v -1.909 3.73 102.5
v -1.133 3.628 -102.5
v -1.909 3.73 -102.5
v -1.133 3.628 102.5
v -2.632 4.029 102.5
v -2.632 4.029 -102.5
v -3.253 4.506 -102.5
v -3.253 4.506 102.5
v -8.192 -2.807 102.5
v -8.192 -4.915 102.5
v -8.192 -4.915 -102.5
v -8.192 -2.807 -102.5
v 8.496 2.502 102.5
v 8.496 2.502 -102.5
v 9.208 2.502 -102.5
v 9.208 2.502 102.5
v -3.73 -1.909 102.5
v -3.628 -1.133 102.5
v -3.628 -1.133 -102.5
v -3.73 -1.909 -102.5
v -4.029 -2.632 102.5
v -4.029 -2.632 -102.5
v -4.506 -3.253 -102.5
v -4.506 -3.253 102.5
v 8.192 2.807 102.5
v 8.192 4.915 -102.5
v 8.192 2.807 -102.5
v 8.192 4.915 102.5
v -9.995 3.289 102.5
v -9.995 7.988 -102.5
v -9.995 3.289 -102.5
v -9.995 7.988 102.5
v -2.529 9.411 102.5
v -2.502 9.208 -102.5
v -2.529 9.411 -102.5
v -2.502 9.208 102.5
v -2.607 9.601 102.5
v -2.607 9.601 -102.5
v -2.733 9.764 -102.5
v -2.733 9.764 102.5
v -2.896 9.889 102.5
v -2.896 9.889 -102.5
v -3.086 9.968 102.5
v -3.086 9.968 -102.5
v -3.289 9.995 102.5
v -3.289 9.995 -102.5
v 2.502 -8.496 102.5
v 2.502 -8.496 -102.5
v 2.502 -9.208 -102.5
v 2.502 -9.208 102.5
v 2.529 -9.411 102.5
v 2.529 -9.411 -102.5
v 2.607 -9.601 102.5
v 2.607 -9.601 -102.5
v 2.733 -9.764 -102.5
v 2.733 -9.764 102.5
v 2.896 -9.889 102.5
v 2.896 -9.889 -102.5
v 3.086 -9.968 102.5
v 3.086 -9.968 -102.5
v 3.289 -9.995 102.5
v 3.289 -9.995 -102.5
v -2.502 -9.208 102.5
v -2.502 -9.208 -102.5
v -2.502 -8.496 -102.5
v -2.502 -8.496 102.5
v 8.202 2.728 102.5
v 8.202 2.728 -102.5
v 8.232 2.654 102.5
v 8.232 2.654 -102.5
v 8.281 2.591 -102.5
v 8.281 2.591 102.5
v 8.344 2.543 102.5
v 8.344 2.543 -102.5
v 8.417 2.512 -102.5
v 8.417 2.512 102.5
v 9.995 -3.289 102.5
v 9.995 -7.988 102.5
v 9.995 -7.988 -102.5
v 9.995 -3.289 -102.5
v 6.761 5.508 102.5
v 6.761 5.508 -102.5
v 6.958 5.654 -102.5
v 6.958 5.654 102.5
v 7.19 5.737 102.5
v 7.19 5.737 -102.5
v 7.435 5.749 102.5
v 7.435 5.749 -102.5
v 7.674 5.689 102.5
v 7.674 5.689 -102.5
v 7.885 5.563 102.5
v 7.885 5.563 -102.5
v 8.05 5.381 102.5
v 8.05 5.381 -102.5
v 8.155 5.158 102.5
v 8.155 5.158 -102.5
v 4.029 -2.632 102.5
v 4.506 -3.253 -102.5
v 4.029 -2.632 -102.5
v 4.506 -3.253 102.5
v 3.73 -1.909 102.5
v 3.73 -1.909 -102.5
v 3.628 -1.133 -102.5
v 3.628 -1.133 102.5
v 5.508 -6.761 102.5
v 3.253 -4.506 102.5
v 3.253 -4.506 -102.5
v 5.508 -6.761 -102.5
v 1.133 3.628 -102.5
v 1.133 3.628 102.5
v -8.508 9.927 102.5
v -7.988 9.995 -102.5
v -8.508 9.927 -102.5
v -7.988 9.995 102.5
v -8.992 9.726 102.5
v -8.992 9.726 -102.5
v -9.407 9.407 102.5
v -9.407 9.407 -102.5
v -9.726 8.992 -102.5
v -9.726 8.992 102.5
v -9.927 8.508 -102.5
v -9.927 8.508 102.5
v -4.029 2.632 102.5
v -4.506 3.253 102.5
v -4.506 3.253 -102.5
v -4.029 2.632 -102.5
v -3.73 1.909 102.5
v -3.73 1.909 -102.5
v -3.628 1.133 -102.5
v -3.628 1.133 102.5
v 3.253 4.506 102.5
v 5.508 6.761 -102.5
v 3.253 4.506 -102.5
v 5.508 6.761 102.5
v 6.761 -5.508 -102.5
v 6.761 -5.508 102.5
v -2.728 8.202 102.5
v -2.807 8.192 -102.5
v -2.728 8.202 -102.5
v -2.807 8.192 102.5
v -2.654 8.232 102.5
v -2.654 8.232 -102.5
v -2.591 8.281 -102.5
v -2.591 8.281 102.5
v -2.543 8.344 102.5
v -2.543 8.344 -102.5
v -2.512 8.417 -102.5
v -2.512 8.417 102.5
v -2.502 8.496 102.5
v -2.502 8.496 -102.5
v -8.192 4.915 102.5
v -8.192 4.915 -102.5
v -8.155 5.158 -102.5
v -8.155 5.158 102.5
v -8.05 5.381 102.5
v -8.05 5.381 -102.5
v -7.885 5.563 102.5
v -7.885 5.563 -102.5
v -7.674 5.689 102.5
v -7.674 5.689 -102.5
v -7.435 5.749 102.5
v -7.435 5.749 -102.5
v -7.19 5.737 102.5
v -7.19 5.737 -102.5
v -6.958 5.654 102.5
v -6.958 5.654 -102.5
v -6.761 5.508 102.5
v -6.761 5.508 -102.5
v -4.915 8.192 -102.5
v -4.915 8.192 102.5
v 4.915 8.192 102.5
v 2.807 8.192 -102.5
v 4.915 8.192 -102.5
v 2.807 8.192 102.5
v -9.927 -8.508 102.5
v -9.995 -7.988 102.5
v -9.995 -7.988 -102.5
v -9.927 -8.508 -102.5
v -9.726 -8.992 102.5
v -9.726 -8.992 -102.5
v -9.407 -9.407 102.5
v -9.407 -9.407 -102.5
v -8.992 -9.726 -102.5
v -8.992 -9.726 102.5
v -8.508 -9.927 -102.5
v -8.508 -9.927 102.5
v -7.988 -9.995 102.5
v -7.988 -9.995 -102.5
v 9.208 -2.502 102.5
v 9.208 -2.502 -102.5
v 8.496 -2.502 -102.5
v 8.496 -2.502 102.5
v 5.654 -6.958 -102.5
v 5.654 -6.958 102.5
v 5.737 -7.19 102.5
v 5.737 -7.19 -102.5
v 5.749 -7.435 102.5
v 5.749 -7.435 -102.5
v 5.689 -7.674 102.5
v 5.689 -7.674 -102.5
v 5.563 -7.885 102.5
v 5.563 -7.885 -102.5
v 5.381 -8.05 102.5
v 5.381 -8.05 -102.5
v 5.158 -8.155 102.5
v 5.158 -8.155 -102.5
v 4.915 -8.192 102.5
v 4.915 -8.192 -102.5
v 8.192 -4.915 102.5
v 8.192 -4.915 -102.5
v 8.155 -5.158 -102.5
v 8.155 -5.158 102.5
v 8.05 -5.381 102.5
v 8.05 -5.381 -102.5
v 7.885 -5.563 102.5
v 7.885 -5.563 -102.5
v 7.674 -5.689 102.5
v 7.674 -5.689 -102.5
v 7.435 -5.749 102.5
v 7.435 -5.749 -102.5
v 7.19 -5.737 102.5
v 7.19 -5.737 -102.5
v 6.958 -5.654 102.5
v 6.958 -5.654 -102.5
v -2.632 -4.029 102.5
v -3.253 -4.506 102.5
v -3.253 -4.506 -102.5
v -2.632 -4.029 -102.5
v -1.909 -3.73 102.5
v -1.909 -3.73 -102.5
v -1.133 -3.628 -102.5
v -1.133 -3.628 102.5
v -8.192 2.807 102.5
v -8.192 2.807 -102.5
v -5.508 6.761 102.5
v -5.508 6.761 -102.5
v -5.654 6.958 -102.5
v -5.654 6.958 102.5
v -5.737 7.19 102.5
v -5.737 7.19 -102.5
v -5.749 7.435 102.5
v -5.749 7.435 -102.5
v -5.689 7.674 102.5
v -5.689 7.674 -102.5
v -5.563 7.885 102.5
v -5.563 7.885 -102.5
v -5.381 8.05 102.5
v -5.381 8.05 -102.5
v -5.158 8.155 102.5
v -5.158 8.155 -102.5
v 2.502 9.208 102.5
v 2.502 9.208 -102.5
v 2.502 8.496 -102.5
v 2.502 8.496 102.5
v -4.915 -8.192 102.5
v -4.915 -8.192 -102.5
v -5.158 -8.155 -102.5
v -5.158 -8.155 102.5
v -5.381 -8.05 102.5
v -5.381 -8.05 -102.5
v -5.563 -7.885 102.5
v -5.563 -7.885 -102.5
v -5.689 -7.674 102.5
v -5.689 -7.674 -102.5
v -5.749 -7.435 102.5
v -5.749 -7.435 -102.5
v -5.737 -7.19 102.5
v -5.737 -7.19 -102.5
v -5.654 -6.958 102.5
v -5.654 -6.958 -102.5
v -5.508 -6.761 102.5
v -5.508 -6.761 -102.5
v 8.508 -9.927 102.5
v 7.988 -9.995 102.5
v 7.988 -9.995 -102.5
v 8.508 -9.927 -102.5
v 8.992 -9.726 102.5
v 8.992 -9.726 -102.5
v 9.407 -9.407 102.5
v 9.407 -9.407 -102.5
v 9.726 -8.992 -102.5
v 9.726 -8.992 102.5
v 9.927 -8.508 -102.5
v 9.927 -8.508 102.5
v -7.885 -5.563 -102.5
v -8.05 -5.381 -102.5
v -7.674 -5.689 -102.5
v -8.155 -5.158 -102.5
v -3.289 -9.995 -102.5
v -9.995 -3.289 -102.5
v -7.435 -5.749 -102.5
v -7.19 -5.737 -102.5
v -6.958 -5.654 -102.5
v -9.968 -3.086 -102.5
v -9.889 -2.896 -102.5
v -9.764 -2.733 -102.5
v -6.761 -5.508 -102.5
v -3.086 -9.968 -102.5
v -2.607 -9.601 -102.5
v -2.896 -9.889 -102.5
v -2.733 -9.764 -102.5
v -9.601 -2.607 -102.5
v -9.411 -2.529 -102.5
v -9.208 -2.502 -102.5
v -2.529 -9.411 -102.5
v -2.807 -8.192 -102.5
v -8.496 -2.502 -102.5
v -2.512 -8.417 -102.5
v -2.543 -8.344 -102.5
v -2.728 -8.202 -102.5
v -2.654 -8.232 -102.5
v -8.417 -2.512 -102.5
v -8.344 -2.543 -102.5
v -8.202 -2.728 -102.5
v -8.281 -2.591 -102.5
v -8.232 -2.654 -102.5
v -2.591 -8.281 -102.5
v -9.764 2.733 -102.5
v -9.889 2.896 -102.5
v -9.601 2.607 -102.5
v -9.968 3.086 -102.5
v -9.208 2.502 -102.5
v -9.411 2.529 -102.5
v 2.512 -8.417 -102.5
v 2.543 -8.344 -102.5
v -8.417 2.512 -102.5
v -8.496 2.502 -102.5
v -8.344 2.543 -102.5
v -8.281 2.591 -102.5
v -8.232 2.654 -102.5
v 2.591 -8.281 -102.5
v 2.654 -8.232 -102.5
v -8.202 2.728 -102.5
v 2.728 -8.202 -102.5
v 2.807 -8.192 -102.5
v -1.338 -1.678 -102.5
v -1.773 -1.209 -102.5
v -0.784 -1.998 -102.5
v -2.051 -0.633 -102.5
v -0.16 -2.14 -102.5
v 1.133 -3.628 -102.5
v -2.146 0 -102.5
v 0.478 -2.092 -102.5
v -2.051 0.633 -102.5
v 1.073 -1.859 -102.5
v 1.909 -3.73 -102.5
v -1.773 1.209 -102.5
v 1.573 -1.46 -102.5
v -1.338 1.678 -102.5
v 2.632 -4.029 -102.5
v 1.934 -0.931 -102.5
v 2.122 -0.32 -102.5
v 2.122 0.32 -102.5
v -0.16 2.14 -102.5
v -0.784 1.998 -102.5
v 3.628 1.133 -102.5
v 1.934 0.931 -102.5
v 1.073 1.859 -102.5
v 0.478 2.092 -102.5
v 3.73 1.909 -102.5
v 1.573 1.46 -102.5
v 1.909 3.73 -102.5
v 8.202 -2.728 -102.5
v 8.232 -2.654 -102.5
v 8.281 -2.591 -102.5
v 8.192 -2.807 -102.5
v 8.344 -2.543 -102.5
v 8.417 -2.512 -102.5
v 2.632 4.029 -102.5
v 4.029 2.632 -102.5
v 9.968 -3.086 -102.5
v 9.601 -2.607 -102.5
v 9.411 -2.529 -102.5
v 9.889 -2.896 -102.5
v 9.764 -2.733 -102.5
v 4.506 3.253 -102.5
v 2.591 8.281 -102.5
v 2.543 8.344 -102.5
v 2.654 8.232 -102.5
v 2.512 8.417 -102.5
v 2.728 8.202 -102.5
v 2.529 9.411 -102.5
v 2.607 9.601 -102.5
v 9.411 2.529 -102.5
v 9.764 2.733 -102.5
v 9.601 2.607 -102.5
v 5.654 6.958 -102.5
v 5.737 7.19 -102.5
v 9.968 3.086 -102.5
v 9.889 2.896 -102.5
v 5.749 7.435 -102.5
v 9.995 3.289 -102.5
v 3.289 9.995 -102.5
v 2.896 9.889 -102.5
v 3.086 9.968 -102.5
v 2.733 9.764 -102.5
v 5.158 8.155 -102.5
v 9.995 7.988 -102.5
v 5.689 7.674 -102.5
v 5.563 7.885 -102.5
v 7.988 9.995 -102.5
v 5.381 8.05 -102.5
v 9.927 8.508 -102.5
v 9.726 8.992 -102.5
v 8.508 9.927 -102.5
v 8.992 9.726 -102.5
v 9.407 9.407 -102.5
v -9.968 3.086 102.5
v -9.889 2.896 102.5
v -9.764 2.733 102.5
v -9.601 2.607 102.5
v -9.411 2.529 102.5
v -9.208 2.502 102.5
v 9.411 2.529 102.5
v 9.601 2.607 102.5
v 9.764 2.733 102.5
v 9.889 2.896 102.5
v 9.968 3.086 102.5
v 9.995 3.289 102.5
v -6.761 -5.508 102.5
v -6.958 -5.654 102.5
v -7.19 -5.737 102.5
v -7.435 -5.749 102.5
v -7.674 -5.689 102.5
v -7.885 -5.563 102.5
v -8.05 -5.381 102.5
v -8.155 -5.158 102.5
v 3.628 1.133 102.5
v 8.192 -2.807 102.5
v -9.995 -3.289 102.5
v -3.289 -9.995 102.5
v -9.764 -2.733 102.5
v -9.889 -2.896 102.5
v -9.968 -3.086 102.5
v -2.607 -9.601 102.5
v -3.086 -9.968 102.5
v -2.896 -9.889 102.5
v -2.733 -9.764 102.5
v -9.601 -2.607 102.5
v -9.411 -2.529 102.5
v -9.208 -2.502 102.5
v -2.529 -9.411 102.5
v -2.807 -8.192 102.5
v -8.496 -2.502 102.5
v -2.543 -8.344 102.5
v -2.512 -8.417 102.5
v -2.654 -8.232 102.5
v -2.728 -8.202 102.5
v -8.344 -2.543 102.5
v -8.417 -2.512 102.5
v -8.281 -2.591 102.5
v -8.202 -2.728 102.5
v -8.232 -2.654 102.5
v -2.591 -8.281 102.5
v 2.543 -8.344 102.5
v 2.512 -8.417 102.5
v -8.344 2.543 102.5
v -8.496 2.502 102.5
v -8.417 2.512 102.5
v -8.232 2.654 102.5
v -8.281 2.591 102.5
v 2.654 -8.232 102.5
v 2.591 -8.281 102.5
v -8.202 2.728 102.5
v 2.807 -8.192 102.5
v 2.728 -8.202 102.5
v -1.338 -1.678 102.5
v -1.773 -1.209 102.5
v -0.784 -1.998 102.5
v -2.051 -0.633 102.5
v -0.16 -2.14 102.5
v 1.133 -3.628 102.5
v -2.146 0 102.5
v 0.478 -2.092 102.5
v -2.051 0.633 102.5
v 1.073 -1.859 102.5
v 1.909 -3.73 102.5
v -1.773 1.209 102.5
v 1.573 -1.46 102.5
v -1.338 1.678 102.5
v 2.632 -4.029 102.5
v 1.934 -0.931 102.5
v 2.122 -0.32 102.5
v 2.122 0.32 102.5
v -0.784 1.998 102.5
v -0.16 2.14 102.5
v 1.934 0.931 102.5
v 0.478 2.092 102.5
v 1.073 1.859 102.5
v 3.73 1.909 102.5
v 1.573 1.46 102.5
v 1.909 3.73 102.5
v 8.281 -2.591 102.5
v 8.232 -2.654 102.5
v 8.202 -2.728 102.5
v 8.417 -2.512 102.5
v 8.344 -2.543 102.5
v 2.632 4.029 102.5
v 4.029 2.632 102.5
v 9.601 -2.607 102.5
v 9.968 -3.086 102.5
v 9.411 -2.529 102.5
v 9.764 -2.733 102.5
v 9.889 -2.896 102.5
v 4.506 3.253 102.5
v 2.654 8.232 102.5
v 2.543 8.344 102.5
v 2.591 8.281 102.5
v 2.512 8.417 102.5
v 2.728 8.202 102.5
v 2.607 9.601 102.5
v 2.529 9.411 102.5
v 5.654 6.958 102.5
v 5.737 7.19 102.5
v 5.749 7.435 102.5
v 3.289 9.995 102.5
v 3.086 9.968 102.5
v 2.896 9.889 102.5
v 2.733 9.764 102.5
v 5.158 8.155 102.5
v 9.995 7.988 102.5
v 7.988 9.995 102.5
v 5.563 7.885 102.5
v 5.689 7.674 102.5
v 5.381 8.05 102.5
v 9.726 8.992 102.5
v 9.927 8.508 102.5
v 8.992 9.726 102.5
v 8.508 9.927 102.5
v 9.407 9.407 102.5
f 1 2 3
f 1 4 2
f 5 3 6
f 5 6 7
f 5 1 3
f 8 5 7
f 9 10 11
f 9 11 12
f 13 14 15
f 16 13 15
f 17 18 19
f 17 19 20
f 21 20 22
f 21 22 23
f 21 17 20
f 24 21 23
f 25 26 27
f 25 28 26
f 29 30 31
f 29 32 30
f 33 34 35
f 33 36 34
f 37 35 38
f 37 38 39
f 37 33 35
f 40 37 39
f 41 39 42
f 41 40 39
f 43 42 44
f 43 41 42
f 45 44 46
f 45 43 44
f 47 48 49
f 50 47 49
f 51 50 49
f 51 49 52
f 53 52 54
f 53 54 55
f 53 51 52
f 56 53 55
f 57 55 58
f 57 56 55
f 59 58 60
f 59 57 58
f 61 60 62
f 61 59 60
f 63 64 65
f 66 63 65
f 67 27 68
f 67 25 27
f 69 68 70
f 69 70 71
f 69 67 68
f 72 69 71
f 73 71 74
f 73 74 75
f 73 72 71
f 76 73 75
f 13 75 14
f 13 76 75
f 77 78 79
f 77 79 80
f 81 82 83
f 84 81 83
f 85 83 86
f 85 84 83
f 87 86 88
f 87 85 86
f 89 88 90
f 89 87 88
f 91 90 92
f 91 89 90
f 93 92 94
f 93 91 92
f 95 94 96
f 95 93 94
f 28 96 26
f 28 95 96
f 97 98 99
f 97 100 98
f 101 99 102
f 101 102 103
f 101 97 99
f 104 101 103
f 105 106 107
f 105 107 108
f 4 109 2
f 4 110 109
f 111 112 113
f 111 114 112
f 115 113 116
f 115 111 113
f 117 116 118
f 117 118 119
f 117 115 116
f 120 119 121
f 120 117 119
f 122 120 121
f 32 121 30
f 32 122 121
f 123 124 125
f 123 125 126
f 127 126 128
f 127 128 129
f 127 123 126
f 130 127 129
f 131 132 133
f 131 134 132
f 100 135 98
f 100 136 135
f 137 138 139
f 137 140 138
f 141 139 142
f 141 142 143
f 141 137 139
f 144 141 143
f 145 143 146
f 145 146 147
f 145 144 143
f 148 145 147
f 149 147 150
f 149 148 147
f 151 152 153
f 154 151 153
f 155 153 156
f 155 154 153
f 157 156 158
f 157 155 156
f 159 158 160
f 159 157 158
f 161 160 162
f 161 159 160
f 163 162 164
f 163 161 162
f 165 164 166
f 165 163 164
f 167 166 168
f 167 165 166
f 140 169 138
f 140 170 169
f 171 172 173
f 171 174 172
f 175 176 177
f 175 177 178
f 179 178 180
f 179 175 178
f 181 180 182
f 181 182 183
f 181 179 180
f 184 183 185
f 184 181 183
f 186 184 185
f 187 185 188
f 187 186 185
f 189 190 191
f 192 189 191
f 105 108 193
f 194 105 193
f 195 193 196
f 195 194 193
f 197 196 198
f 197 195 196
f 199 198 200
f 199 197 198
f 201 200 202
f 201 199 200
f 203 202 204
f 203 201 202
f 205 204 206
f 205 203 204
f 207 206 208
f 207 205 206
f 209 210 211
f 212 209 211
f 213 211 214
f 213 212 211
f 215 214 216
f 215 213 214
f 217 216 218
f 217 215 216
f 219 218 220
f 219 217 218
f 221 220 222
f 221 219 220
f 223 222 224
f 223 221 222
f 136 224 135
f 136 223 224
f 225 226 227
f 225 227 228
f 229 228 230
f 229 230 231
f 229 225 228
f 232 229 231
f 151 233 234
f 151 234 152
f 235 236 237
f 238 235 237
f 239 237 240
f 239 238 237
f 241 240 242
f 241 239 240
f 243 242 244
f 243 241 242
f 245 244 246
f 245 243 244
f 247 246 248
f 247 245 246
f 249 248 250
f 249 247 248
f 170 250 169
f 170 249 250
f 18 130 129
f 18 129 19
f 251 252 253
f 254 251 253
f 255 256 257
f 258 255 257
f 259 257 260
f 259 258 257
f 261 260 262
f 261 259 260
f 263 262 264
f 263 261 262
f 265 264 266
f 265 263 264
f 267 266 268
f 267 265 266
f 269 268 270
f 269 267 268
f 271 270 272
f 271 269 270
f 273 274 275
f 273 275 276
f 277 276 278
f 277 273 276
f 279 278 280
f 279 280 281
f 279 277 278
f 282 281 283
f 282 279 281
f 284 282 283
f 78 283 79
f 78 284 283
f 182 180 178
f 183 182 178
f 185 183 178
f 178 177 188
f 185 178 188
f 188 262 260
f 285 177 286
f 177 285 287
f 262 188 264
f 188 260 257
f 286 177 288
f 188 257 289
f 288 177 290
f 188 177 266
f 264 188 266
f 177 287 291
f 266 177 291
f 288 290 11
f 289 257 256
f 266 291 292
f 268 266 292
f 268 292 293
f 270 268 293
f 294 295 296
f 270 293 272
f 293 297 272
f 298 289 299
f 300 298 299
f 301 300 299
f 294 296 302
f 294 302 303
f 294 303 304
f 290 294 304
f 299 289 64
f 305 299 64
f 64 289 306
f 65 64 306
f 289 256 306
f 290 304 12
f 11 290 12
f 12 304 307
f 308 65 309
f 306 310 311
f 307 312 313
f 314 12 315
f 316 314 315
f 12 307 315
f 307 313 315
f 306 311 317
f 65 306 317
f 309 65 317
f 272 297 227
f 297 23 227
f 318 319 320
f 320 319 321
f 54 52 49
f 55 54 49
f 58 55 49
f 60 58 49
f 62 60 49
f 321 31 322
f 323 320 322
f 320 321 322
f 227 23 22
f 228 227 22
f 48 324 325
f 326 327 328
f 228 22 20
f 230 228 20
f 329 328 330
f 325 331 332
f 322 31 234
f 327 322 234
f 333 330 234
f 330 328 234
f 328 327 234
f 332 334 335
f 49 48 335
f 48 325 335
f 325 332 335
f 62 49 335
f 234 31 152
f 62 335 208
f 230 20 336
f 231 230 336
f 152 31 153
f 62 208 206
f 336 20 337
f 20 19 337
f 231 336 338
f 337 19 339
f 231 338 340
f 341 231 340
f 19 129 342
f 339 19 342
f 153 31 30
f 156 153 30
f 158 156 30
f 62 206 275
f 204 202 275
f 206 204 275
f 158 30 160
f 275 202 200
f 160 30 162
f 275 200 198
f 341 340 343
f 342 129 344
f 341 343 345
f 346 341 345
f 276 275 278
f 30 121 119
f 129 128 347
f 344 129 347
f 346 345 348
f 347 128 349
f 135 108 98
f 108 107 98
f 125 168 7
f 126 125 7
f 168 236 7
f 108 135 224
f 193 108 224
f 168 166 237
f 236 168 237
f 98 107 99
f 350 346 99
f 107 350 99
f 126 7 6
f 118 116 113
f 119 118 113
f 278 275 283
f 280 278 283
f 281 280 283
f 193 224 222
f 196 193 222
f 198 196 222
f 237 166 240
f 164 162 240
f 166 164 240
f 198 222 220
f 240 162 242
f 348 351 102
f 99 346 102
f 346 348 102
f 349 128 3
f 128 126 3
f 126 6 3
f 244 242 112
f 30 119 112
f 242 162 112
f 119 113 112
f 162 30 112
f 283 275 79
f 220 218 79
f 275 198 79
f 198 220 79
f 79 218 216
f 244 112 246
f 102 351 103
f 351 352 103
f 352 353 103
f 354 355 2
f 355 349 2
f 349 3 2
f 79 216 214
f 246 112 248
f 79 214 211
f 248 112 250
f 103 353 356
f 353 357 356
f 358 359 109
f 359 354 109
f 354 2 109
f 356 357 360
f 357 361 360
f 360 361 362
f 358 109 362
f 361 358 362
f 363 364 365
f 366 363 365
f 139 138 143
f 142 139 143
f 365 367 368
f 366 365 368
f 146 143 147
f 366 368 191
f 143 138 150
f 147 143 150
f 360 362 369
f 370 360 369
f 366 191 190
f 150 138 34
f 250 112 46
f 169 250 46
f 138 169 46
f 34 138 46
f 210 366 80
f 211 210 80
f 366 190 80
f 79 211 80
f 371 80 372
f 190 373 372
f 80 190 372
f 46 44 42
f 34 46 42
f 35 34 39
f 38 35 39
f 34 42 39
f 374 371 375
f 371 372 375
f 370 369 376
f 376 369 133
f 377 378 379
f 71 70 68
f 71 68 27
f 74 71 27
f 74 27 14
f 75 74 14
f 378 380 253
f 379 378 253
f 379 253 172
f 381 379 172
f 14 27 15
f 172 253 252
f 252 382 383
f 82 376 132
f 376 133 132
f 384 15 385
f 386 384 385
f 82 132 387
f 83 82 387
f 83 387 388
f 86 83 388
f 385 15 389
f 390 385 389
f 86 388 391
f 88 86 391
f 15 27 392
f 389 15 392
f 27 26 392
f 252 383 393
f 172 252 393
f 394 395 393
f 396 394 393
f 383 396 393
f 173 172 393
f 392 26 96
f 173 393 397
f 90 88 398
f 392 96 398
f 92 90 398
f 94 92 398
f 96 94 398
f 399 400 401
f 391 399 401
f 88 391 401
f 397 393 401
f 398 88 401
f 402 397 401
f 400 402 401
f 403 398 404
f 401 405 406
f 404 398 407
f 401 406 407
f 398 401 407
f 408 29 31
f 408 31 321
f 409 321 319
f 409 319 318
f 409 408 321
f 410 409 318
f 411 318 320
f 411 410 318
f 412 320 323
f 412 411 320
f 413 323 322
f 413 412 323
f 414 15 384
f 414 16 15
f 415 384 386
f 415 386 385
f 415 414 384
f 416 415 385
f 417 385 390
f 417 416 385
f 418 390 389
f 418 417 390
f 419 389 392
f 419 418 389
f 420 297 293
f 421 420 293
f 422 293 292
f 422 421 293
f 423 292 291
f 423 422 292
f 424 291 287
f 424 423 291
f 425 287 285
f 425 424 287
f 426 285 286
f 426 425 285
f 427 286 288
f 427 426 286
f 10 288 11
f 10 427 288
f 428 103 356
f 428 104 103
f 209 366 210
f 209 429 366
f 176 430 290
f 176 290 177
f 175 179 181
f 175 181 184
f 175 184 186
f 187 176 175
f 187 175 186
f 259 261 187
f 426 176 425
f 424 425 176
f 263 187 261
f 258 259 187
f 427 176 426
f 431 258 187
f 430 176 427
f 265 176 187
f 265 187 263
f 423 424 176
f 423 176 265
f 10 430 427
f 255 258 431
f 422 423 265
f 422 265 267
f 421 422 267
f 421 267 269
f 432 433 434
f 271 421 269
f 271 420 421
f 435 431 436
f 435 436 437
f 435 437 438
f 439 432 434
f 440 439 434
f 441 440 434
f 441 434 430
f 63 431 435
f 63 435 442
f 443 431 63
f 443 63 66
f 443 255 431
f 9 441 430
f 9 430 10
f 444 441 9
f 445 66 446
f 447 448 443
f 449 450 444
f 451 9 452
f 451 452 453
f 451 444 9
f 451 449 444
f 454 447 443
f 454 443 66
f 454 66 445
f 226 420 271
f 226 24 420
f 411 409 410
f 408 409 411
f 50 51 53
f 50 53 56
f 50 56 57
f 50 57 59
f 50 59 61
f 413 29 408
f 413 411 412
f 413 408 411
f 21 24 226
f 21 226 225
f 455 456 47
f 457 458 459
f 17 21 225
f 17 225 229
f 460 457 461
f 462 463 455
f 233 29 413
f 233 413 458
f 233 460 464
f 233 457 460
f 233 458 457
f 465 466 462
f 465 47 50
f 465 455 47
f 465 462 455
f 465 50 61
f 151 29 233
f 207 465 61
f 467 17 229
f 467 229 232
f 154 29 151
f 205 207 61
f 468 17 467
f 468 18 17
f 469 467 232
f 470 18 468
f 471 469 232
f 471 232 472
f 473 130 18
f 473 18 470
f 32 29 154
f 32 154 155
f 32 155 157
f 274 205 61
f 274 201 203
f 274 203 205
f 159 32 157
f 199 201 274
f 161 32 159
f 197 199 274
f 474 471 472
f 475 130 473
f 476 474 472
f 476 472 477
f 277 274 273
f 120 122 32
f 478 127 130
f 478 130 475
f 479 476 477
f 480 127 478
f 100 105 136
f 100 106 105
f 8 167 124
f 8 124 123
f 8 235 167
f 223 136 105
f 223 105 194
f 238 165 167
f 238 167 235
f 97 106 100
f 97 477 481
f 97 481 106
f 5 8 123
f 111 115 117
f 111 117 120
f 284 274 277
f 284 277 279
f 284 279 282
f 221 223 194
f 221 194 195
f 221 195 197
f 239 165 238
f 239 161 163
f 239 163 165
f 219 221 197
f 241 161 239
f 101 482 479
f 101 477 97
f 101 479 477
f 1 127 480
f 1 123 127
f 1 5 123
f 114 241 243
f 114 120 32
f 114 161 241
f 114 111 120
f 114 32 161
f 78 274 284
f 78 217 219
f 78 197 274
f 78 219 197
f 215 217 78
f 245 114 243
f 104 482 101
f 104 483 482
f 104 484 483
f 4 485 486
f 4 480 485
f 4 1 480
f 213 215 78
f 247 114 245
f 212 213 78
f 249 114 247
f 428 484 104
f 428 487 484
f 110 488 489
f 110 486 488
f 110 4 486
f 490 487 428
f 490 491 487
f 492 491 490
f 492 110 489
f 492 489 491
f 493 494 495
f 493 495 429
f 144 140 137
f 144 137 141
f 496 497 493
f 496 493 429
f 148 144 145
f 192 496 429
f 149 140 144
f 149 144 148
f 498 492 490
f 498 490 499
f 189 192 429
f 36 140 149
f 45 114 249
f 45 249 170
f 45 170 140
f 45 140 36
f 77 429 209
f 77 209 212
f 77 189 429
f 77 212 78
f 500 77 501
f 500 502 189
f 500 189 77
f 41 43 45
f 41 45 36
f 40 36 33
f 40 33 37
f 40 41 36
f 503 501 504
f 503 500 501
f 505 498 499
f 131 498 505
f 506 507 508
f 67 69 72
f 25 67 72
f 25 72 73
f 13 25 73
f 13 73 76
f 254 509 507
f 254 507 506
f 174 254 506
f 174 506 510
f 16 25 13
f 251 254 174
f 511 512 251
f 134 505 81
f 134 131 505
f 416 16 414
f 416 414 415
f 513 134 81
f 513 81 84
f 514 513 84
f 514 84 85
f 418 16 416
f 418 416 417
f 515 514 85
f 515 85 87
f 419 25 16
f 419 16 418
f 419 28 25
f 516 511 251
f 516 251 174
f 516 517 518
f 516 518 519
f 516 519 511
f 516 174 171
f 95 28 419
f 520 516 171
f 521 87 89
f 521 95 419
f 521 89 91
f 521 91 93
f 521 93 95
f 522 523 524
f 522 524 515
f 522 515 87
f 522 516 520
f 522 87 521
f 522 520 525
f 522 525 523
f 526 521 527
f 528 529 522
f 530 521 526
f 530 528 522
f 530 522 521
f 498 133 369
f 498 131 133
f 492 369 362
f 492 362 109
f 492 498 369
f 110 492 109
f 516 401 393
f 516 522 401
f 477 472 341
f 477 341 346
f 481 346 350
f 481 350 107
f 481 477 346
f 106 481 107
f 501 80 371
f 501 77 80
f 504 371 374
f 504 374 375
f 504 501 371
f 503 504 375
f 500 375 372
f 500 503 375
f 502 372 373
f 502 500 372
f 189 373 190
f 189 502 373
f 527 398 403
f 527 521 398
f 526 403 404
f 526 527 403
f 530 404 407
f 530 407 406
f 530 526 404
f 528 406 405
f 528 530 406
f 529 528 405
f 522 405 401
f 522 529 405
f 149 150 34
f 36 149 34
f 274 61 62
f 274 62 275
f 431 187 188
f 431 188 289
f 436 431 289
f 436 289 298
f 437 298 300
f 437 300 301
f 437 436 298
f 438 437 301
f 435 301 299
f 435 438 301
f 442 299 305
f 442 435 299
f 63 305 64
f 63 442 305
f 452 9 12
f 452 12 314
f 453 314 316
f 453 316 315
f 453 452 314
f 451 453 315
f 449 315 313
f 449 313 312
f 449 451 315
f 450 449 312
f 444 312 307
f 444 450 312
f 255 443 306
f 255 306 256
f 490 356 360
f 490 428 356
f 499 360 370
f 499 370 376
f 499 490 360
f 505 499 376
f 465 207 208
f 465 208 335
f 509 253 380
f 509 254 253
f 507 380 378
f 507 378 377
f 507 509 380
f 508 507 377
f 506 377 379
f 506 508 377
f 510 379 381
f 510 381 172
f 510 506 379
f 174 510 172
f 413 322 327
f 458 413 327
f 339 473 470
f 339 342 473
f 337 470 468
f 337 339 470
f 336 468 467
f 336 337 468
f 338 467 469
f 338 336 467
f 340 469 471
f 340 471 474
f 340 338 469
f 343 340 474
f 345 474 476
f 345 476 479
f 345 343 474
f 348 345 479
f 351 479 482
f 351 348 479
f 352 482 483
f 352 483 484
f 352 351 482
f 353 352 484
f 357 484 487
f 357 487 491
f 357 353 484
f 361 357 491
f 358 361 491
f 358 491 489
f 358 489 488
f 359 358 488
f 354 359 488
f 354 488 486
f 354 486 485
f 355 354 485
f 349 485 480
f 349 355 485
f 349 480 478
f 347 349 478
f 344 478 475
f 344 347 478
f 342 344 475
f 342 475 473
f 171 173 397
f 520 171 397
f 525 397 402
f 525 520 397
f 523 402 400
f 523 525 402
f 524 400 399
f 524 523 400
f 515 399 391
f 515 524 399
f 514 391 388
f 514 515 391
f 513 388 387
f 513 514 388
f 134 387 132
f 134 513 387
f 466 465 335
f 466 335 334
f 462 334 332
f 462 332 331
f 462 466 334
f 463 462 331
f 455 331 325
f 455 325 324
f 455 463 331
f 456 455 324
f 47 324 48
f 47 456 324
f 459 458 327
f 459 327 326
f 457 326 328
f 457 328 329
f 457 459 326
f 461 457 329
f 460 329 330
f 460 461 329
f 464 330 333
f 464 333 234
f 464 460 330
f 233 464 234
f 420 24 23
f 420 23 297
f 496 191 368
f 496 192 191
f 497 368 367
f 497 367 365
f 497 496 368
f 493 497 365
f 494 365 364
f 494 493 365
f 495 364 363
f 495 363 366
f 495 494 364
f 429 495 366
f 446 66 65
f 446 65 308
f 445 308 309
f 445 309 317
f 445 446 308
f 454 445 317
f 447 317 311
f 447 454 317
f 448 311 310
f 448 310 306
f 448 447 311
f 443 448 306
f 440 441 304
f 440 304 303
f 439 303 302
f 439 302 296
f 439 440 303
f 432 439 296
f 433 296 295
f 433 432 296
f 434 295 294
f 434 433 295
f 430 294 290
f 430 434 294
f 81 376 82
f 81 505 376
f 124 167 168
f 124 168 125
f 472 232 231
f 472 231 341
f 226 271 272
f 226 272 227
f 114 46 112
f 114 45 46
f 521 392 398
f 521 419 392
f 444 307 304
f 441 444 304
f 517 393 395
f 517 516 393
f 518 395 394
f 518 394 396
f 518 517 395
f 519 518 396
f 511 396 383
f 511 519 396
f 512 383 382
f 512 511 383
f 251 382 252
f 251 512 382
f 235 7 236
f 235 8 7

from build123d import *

# Parameters (mm, degrees)
SKETCH1_R           = 2.1463
BOSS_EXTRUDE1_DEPTH = 102.5


with BuildPart() as part:
    # Sketch1 → Boss-Extrude1 (new, symmetric)
    with BuildSketch(Plane.XY):
        with BuildLine():
            Line((-9.9949, 7.9883), (-9.9949, 3.2893))
            ThreePointArc((-9.9949, 3.2893), (-9.76427588, 2.73252412), (-9.2075, 2.5019))
            Line((-9.2075, 2.5019), (-8.4963, 2.5019))
            ThreePointArc((-8.4963, 2.5019), (-8.280773853, 2.591173853), (-8.1915, 2.8067))
            Line((-8.1915, 2.8067), (-8.1915, 4.9149))
            ThreePointArc((-8.1915, 4.9149), (-7.674065253, 5.689295824), (-6.760603096, 5.507596904))
            Line((-6.760603096, 5.507596904), (-4.505765747, 3.252759555))
            ThreePointArc((-4.505765747, 3.252759555), (-3.856054457, 2.280397894), (-3.627906192, 1.133419111))
            Line((-3.627906192, 1.133419111), (-3.627906192, -1.133419111))
            ThreePointArc((-3.627906192, -1.133419111), (-3.856054457, -2.280397894), (-4.505765747, -3.252759555))
            Line((-4.505765747, -3.252759555), (-6.760603096, -5.507596904))
            ThreePointArc((-6.760603096, -5.507596904), (-7.674065253, -5.689295824), (-8.1915, -4.9149))
            Line((-8.1915, -4.9149), (-8.1915, -2.8067))
            ThreePointArc((-8.1915, -2.8067), (-8.280773853, -2.591173853), (-8.4963, -2.5019))
            Line((-8.4963, -2.5019), (-9.2075, -2.5019))
            ThreePointArc((-9.2075, -2.5019), (-9.76427588, -2.73252412), (-9.9949, -3.2893))
            Line((-9.9949, -3.2893), (-9.9949, -7.9883))
            ThreePointArc((-9.9949, -7.9883), (-9.407180467, -9.407180467), (-7.9883, -9.9949))
            Line((-7.9883, -9.9949), (-3.2893, -9.9949))
            ThreePointArc((-3.2893, -9.9949), (-2.73252412, -9.76427588), (-2.5019, -9.2075))
            Line((-2.5019, -9.2075), (-2.5019, -8.4963))
            ThreePointArc((-2.5019, -8.4963), (-2.591173853, -8.280773853), (-2.8067, -8.1915))
            Line((-2.8067, -8.1915), (-4.9149, -8.1915))
            ThreePointArc((-4.9149, -8.1915), (-5.689295824, -7.674065253), (-5.507596904, -6.760603096))
            Line((-5.507596904, -6.760603096), (-3.252759555, -4.505765747))
            ThreePointArc((-3.252759555, -4.505765747), (-2.280397894, -3.856054457), (-1.133419111, -3.627906192))
            Line((-1.133419111, -3.627906192), (1.133419111, -3.627906192))
            ThreePointArc((1.133419111, -3.627906192), (2.280397894, -3.856054457), (3.252759555, -4.505765747))
            Line((3.252759555, -4.505765747), (5.507596904, -6.760603096))
            ThreePointArc((5.507596904, -6.760603096), (5.689295824, -7.674065253), (4.9149, -8.1915))
            Line((4.9149, -8.1915), (2.8067, -8.1915))
            ThreePointArc((2.8067, -8.1915), (2.591173853, -8.280773853), (2.5019, -8.4963))
            Line((2.5019, -8.4963), (2.5019, -9.2075))
            ThreePointArc((2.5019, -9.2075), (2.73252412, -9.76427588), (3.2893, -9.9949))
            Line((3.2893, -9.9949), (7.9883, -9.9949))
            ThreePointArc((7.9883, -9.9949), (9.407180467, -9.407180467), (9.9949, -7.9883))
            Line((9.9949, -7.9883), (9.9949, -3.2893))
            ThreePointArc((9.9949, -3.2893), (9.76427588, -2.73252412), (9.2075, -2.5019))
            Line((9.2075, -2.5019), (8.4963, -2.5019))
            ThreePointArc((8.4963, -2.5019), (8.280773853, -2.591173853), (8.1915, -2.8067))
            Line((8.1915, -2.8067), (8.1915, -4.9149))
            ThreePointArc((8.1915, -4.9149), (7.674065253, -5.689295824), (6.760603096, -5.507596904))
            Line((6.760603096, -5.507596904), (4.505765747, -3.252759555))
            ThreePointArc((4.505765747, -3.252759555), (3.856054457, -2.280397894), (3.627906192, -1.133419111))
            Line((3.627906192, -1.133419111), (3.627906192, 1.133419111))
            ThreePointArc((3.627906192, 1.133419111), (3.856054457, 2.280397894), (4.505765747, 3.252759555))
            Line((4.505765747, 3.252759555), (6.760603096, 5.507596904))
            ThreePointArc((6.760603096, 5.507596904), (7.674065253, 5.689295824), (8.1915, 4.9149))
            Line((8.1915, 4.9149), (8.1915, 2.8067))
            ThreePointArc((8.1915, 2.8067), (8.280773853, 2.591173853), (8.4963, 2.5019))
            Line((8.4963, 2.5019), (9.2075, 2.5019))
            ThreePointArc((9.2075, 2.5019), (9.76427588, 2.73252412), (9.9949, 3.2893))
            Line((9.9949, 3.2893), (9.9949, 7.9883))
            ThreePointArc((9.9949, 7.9883), (9.407180467, 9.407180467), (7.9883, 9.9949))
            Line((7.9883, 9.9949), (3.2893, 9.9949))
            ThreePointArc((3.2893, 9.9949), (2.73252412, 9.76427588), (2.5019, 9.2075))
            Line((2.5019, 9.2075), (2.5019, 8.4963))
            ThreePointArc((2.5019, 8.4963), (2.591173853, 8.280773853), (2.8067, 8.1915))
            Line((2.8067, 8.1915), (4.9149, 8.1915))
            ThreePointArc((4.9149, 8.1915), (5.689295824, 7.674065253), (5.507596904, 6.760603096))
            Line((5.507596904, 6.760603096), (3.252759555, 4.505765747))
            ThreePointArc((3.252759555, 4.505765747), (2.280397894, 3.856054457), (1.133419111, 3.627906192))
            Line((1.133419111, 3.627906192), (-1.133419111, 3.627906192))
            ThreePointArc((-1.133419111, 3.627906192), (-2.280397894, 3.856054457), (-3.252759555, 4.505765747))
            Line((-3.252759555, 4.505765747), (-5.507596904, 6.760603096))
            ThreePointArc((-5.507596904, 6.760603096), (-5.689295824, 7.674065253), (-4.9149, 8.1915))
            Line((-4.9149, 8.1915), (-2.8067, 8.1915))
            ThreePointArc((-2.8067, 8.1915), (-2.591173853, 8.280773853), (-2.5019, 8.4963))
            Line((-2.5019, 8.4963), (-2.5019, 9.2075))
            ThreePointArc((-2.5019, 9.2075), (-2.73252412, 9.76427588), (-3.2893, 9.9949))
            Line((-3.2893, 9.9949), (-7.9883, 9.9949))
            ThreePointArc((-7.9883, 9.9949), (-9.407180467, 9.407180467), (-9.9949, 7.9883))
        make_face()
        with Locations(Location((0, 0, 0), (0, 0, 180))):
            Circle(SKETCH1_R, mode=Mode.SUBTRACT)
    extrude(amount=BOSS_EXTRUDE1_DEPTH, both=True)


solid = part.part
